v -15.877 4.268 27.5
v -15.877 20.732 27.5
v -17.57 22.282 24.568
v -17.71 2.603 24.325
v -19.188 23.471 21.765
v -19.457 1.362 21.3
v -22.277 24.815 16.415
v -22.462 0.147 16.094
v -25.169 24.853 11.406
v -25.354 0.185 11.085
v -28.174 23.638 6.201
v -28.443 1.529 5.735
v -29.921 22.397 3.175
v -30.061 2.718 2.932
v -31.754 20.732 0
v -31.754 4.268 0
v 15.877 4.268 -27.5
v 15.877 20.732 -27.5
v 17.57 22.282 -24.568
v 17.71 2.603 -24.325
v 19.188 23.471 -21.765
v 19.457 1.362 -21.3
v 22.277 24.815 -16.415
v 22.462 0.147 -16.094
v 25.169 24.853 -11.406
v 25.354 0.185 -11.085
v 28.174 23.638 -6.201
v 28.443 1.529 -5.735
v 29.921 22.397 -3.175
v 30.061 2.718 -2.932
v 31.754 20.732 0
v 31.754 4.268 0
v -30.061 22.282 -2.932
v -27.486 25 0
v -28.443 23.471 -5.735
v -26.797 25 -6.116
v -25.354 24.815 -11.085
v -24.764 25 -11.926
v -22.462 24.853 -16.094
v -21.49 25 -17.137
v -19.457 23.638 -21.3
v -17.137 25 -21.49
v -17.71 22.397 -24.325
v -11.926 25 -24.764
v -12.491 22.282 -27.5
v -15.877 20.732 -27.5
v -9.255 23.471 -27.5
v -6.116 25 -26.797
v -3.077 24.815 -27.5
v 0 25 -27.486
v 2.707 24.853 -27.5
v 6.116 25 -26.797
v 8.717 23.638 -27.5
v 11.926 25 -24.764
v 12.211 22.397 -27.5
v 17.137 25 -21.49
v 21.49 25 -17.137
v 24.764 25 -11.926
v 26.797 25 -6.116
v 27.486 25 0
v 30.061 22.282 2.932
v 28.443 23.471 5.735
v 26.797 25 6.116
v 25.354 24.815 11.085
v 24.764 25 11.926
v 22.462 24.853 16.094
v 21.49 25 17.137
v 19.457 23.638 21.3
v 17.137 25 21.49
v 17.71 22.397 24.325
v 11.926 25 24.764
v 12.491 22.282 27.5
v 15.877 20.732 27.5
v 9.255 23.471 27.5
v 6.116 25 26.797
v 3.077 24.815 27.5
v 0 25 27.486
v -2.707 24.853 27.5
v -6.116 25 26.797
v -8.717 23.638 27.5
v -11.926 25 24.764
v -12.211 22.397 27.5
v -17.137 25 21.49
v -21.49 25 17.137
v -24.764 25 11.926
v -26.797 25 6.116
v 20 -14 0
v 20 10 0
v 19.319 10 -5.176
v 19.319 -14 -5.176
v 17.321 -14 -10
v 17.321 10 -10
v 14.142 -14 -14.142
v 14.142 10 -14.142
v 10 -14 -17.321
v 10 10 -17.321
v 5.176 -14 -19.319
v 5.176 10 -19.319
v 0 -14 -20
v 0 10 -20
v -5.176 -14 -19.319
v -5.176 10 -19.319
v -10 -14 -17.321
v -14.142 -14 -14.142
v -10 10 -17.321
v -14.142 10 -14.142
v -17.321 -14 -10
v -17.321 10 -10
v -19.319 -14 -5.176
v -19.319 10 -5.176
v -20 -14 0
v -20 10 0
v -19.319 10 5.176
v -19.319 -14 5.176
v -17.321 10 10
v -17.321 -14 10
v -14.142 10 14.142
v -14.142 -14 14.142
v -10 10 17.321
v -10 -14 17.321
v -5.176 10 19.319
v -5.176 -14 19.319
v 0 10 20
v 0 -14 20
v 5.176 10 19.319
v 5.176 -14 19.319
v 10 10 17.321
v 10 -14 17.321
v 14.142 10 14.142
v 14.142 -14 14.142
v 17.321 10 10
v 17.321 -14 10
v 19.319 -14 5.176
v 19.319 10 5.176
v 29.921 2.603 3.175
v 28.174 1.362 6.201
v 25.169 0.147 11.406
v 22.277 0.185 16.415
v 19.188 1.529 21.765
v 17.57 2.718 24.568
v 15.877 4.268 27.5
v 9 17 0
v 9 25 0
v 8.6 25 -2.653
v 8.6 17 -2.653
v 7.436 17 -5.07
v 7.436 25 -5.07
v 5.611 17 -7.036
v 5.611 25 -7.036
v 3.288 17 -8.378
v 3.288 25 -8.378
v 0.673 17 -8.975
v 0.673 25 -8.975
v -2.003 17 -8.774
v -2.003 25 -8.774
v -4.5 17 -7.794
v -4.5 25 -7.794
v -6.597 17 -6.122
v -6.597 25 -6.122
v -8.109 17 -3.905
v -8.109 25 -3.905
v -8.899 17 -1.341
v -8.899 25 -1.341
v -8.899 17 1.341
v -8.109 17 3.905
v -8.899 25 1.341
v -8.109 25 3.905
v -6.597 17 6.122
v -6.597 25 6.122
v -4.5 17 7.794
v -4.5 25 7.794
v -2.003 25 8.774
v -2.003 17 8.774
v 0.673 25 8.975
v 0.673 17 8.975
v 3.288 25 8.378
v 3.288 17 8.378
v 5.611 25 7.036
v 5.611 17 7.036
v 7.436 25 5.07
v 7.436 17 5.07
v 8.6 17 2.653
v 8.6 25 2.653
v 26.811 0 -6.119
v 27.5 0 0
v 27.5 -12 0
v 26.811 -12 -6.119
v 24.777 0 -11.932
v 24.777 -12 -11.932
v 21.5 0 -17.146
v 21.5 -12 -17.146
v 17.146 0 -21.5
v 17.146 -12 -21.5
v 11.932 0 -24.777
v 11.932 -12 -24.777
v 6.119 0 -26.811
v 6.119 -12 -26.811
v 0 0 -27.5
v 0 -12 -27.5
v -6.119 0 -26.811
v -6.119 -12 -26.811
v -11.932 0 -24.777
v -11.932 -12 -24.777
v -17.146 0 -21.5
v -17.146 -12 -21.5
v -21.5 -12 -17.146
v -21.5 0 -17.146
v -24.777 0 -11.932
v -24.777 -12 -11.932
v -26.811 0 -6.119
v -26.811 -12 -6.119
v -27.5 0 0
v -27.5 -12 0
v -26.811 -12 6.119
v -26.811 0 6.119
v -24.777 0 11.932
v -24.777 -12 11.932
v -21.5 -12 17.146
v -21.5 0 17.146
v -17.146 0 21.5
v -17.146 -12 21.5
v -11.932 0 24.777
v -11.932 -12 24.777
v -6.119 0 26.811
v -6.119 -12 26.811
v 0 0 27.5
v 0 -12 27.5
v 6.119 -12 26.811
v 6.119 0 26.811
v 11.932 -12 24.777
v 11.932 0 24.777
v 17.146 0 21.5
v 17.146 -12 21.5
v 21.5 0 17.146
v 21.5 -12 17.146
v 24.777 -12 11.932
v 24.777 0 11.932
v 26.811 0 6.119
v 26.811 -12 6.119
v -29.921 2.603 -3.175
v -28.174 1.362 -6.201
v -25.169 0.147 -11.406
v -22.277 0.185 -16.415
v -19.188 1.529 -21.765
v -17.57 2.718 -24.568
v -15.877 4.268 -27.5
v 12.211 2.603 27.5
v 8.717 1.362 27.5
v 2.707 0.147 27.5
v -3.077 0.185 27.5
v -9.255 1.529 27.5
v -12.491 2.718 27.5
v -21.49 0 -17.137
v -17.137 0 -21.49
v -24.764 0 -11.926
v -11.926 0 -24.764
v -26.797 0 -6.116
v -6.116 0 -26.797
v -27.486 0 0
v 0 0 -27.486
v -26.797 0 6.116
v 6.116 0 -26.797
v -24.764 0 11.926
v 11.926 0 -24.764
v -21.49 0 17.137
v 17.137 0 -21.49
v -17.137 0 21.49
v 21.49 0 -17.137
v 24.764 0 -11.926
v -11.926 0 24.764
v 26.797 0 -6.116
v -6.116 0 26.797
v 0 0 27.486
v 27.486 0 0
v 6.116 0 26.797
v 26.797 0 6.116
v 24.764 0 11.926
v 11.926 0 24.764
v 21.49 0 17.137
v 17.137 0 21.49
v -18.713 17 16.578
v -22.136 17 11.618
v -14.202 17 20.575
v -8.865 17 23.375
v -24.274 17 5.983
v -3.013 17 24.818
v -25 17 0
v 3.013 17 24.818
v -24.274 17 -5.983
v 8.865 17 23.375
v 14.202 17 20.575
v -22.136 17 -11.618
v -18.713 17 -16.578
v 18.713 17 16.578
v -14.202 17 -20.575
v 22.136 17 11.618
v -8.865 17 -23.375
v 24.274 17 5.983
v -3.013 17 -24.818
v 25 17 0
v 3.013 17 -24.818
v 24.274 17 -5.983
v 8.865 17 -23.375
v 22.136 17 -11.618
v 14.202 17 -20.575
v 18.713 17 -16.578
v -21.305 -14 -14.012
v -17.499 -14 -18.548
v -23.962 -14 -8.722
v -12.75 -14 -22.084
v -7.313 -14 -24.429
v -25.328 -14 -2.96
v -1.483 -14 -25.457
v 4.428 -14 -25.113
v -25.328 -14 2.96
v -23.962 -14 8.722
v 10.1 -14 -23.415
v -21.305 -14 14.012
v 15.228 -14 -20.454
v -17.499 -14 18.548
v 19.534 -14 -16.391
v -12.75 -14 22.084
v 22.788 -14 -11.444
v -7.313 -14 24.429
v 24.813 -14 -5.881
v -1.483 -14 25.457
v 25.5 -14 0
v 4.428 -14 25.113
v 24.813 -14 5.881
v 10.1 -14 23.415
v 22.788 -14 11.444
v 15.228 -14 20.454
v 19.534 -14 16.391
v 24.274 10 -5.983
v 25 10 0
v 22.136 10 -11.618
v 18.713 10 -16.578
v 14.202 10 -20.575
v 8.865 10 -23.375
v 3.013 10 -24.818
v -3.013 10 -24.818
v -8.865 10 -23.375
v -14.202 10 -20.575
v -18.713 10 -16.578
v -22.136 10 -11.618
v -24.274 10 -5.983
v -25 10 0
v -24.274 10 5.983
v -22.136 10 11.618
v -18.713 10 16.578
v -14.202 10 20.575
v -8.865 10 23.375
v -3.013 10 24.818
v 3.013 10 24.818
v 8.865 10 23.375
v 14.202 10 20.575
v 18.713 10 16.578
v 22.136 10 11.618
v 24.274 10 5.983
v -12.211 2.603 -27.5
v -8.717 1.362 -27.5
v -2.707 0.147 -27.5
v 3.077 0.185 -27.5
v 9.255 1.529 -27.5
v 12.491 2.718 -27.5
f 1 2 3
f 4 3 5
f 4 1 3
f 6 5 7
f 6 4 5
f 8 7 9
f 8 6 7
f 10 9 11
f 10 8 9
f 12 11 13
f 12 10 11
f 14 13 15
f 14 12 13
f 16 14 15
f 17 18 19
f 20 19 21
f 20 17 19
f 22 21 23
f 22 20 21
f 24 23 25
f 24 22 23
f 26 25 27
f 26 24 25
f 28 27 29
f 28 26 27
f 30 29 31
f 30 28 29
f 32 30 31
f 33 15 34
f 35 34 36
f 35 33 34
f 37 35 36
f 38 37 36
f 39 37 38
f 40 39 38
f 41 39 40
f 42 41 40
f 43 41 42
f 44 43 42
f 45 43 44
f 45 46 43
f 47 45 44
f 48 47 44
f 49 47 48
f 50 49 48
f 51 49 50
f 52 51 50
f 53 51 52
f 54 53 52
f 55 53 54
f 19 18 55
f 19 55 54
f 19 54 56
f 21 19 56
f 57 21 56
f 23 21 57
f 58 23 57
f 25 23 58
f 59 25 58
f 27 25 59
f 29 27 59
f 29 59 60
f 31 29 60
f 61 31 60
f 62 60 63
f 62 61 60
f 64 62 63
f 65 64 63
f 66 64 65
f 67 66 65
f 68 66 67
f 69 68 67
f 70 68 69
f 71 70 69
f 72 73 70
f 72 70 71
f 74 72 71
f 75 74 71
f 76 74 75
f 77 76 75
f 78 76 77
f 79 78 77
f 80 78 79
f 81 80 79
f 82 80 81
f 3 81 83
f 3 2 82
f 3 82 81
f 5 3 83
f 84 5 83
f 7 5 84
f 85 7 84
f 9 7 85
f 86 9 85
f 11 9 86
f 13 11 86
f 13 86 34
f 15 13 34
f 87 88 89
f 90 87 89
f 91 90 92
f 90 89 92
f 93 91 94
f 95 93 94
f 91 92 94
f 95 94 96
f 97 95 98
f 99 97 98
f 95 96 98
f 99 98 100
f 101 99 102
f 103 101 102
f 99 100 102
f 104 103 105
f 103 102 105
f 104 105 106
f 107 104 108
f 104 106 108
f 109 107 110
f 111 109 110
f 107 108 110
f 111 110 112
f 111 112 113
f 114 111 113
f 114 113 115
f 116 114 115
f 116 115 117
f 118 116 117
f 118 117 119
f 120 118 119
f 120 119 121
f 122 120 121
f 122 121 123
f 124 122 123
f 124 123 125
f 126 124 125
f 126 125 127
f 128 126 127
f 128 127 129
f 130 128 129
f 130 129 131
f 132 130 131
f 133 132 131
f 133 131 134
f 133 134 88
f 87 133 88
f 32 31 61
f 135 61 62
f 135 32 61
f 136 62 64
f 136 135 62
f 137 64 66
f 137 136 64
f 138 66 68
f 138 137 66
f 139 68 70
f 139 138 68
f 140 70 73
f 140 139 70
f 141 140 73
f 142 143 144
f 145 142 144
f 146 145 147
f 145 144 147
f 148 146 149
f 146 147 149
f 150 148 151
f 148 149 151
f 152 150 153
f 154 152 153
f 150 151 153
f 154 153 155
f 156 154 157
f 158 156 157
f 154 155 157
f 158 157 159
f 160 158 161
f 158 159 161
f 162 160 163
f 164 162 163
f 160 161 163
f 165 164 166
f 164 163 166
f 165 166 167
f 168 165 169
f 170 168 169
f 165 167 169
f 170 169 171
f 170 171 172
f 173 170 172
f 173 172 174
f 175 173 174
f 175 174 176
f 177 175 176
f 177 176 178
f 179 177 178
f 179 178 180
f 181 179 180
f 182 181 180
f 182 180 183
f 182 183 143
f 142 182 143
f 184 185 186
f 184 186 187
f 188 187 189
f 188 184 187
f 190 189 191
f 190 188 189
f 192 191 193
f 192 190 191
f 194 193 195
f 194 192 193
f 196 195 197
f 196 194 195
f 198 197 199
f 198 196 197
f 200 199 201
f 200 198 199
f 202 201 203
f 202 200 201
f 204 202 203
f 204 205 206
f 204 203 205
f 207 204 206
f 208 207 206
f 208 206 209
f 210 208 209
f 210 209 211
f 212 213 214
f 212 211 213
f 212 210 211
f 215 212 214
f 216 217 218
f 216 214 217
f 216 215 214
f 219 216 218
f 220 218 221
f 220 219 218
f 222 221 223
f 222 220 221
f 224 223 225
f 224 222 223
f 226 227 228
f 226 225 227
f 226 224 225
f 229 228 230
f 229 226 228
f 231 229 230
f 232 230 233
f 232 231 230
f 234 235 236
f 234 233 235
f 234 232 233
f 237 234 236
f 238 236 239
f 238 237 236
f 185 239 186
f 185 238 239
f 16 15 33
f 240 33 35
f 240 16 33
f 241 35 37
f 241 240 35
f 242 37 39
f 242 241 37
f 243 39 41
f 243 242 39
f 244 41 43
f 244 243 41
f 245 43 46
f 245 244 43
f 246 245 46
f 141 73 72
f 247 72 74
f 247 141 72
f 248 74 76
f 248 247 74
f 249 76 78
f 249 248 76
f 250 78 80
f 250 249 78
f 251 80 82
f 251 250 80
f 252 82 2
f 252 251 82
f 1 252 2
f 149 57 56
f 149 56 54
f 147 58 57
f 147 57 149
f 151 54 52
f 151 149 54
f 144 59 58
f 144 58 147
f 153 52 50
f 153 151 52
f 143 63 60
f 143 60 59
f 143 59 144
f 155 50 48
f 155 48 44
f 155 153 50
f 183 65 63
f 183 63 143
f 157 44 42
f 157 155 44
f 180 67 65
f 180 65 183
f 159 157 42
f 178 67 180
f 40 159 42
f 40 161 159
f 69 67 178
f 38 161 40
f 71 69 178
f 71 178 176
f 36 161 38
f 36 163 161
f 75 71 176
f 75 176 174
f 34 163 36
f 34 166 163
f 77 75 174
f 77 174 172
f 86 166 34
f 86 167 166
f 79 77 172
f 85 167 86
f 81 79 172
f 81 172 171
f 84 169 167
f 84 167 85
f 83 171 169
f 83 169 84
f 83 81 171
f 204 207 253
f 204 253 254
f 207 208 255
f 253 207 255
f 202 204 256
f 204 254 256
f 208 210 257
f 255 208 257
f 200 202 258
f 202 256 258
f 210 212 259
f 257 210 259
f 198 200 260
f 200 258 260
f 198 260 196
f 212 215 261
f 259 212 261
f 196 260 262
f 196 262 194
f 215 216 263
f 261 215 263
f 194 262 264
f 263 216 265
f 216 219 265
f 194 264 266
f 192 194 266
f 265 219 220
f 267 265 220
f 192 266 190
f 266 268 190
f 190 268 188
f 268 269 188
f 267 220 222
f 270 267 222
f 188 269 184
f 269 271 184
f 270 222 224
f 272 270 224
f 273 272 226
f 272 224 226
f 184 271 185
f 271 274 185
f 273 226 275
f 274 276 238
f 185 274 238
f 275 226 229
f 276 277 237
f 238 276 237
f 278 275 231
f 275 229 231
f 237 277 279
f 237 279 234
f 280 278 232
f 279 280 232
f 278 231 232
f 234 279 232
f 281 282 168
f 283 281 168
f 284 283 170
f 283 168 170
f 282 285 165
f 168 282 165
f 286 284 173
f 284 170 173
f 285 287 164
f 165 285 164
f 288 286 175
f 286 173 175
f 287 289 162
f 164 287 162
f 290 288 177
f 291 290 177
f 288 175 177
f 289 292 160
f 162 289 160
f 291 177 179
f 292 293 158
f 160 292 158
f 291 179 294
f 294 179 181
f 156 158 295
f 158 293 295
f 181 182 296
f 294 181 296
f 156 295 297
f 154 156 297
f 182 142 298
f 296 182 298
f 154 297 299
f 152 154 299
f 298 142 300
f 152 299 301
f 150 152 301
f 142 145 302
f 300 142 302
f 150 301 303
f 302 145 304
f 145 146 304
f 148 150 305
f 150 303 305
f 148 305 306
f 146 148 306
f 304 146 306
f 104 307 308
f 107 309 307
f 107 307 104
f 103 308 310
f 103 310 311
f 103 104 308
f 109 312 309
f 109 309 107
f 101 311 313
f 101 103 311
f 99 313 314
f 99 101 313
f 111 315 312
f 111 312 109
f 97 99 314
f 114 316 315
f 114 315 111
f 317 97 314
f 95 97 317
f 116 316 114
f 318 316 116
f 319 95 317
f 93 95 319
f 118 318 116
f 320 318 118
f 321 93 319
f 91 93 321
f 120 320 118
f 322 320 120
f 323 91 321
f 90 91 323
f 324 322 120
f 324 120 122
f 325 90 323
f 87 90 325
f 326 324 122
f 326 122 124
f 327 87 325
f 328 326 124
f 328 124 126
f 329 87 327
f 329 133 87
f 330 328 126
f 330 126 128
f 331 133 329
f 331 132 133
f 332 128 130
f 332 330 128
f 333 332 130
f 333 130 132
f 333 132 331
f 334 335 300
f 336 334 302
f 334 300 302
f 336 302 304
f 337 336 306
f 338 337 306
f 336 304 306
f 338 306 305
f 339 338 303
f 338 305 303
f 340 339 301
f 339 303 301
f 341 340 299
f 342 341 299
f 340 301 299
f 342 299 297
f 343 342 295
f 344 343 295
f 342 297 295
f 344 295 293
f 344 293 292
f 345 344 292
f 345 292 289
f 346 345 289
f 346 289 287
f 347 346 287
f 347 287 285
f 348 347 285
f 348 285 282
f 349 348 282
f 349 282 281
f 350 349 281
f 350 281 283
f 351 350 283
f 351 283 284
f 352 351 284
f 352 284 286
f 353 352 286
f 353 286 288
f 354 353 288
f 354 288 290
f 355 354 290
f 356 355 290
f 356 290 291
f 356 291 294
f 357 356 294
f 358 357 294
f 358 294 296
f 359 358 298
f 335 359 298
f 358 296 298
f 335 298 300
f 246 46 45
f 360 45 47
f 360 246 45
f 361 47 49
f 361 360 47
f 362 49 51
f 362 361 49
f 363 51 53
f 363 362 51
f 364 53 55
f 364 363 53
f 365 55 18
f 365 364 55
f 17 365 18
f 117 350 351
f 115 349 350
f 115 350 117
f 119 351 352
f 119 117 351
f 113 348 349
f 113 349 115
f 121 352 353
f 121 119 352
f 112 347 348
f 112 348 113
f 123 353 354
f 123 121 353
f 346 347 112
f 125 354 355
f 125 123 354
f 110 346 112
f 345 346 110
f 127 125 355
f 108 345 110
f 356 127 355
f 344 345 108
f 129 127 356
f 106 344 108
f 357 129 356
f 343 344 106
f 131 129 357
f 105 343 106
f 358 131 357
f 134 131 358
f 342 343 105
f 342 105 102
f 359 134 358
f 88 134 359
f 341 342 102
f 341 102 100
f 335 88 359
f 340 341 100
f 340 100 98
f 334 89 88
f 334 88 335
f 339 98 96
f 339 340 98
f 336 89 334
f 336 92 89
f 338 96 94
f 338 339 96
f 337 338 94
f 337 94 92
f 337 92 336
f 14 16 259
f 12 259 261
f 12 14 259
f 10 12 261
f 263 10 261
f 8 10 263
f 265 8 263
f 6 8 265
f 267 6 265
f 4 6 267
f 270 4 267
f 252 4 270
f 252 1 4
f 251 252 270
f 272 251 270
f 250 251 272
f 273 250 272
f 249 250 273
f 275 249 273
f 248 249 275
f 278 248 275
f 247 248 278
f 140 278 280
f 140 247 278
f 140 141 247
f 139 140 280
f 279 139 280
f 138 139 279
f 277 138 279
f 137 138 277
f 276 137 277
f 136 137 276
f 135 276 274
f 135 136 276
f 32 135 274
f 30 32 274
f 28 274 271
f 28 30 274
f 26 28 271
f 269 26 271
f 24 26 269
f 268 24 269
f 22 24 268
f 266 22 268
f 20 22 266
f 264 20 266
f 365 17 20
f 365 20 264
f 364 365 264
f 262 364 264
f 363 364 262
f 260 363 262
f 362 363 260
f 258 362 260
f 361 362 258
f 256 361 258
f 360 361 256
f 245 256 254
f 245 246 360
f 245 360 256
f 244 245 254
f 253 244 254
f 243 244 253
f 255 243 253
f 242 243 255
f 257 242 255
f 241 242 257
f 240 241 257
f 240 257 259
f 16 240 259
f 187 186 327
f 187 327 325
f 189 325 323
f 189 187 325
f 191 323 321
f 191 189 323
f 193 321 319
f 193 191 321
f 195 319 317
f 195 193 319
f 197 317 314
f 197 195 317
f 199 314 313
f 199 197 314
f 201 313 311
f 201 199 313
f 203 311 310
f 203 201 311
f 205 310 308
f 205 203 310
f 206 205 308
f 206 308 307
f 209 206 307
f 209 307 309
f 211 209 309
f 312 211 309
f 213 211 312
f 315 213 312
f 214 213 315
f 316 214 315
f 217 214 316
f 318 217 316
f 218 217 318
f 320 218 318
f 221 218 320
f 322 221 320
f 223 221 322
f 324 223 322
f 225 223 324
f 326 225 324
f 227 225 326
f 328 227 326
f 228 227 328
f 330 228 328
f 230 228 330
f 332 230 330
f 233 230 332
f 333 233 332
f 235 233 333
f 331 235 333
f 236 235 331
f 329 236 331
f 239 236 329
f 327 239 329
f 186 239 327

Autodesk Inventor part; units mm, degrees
ref_plane "YZ Plane" through (0, 0, 0) normal (1, 0, 0) x (0, 1, 0)
ref_plane "XZ Plane" through (0, 0, 0) normal (0, 1, 0) x (-1, 0, 0)
sketch "Sketch4" plane through (0, 0, 0) normal (0, 1, 0) x (-1, 0, 0)
  line L0 (-31.7543, 0) -> (-15.8771, 27.5)
  line L1 (-15.8771, 27.5) -> (15.8771, 27.5)
  line L2 (15.8771, 27.5) -> (31.7543, 0)
  line L3 (31.7543, 0) -> (15.8771, -27.5)
  line L4 (15.8771, -27.5) -> (-15.8771, -27.5)
  line L5 (-15.8771, -27.5) -> (-31.7543, 0)
  line L6 (31.7543, 0) -> (-31.7543, 0)
  point P0 (0, 0)
  point P1 (0, 0)
extrude "Extrusion2" add sketch "Sketch4" along normal blind 25
sketch "Sketch12" plane through (0, 0, 0) normal (0, 0, 1) x (1, 0, 0)
  line L0 (-15.8771, 25) -> (-31.7543, 25) projected
  line L1 (-31.7543, 25) -> (-31.7543, 20.732)
  line L2 (-27.4862, 25) -> (-31.7543, 20.732)
  line L3 (0, -5) -> (0, 30) projected
  point P0 (0, 0)
  dimension "d23" = 45
revolve "Revolution1" cut sketch "Sketch12" angle 360 about axis through (0, -10, 0) along (0, 1, 0)
ref_plane "Work Plane2" through (0, 12.5, 0) normal (0, -1, 0) x (1, 0, 0)
mirror "Mirror1" about plane through (0, 12.5, 0) normal (0, -1, 0) of "Revolution1"
sketch "Sketch13" plane through (0, 25, 0) normal (0, 1, 0) x (1, 0, 0)
  circle A0 centre (0, 0) radius 9
  dimension "d25" = 18
extrude "Extrusion5" cut sketch "Sketch13" against normal blind 8
sketch "Sketch14" plane through (0, 17, 0) normal (0, 1, 0) x (1, 0, 0)
  circle A0 centre (0, 0) radius 25
  dimension "d28" = 50
extrude "Extrusion6" cut sketch "Sketch14" against normal blind 7
sketch "Sketch15" plane through (0, 0, 0) normal (0, -1, 0) x (1, 0, 0)
  circle A0 centre (0, 0) radius 27.5
  dimension "d32" = 55
extrude "Extrusion7" add sketch "Sketch15" along normal blind 14
sketch "Sketch16" plane through (0, 10, 0) normal (0, 1, 0) x (1, 0, 0)
  circle A0 centre (0, 0) radius 20
  dimension "d35" = 40
extrude "Extrusion8" cut sketch "Sketch16" against normal through all
chamfer "Chamfer1" distance 2 angle 45 1 edges at (-27.5, -14, 0)
thread "Thread2" size "M40x3" class "6H" standard "ANSI Metric M Profile" full length
properties part number "00.32.007 \"Nut\"" material "Steel"
